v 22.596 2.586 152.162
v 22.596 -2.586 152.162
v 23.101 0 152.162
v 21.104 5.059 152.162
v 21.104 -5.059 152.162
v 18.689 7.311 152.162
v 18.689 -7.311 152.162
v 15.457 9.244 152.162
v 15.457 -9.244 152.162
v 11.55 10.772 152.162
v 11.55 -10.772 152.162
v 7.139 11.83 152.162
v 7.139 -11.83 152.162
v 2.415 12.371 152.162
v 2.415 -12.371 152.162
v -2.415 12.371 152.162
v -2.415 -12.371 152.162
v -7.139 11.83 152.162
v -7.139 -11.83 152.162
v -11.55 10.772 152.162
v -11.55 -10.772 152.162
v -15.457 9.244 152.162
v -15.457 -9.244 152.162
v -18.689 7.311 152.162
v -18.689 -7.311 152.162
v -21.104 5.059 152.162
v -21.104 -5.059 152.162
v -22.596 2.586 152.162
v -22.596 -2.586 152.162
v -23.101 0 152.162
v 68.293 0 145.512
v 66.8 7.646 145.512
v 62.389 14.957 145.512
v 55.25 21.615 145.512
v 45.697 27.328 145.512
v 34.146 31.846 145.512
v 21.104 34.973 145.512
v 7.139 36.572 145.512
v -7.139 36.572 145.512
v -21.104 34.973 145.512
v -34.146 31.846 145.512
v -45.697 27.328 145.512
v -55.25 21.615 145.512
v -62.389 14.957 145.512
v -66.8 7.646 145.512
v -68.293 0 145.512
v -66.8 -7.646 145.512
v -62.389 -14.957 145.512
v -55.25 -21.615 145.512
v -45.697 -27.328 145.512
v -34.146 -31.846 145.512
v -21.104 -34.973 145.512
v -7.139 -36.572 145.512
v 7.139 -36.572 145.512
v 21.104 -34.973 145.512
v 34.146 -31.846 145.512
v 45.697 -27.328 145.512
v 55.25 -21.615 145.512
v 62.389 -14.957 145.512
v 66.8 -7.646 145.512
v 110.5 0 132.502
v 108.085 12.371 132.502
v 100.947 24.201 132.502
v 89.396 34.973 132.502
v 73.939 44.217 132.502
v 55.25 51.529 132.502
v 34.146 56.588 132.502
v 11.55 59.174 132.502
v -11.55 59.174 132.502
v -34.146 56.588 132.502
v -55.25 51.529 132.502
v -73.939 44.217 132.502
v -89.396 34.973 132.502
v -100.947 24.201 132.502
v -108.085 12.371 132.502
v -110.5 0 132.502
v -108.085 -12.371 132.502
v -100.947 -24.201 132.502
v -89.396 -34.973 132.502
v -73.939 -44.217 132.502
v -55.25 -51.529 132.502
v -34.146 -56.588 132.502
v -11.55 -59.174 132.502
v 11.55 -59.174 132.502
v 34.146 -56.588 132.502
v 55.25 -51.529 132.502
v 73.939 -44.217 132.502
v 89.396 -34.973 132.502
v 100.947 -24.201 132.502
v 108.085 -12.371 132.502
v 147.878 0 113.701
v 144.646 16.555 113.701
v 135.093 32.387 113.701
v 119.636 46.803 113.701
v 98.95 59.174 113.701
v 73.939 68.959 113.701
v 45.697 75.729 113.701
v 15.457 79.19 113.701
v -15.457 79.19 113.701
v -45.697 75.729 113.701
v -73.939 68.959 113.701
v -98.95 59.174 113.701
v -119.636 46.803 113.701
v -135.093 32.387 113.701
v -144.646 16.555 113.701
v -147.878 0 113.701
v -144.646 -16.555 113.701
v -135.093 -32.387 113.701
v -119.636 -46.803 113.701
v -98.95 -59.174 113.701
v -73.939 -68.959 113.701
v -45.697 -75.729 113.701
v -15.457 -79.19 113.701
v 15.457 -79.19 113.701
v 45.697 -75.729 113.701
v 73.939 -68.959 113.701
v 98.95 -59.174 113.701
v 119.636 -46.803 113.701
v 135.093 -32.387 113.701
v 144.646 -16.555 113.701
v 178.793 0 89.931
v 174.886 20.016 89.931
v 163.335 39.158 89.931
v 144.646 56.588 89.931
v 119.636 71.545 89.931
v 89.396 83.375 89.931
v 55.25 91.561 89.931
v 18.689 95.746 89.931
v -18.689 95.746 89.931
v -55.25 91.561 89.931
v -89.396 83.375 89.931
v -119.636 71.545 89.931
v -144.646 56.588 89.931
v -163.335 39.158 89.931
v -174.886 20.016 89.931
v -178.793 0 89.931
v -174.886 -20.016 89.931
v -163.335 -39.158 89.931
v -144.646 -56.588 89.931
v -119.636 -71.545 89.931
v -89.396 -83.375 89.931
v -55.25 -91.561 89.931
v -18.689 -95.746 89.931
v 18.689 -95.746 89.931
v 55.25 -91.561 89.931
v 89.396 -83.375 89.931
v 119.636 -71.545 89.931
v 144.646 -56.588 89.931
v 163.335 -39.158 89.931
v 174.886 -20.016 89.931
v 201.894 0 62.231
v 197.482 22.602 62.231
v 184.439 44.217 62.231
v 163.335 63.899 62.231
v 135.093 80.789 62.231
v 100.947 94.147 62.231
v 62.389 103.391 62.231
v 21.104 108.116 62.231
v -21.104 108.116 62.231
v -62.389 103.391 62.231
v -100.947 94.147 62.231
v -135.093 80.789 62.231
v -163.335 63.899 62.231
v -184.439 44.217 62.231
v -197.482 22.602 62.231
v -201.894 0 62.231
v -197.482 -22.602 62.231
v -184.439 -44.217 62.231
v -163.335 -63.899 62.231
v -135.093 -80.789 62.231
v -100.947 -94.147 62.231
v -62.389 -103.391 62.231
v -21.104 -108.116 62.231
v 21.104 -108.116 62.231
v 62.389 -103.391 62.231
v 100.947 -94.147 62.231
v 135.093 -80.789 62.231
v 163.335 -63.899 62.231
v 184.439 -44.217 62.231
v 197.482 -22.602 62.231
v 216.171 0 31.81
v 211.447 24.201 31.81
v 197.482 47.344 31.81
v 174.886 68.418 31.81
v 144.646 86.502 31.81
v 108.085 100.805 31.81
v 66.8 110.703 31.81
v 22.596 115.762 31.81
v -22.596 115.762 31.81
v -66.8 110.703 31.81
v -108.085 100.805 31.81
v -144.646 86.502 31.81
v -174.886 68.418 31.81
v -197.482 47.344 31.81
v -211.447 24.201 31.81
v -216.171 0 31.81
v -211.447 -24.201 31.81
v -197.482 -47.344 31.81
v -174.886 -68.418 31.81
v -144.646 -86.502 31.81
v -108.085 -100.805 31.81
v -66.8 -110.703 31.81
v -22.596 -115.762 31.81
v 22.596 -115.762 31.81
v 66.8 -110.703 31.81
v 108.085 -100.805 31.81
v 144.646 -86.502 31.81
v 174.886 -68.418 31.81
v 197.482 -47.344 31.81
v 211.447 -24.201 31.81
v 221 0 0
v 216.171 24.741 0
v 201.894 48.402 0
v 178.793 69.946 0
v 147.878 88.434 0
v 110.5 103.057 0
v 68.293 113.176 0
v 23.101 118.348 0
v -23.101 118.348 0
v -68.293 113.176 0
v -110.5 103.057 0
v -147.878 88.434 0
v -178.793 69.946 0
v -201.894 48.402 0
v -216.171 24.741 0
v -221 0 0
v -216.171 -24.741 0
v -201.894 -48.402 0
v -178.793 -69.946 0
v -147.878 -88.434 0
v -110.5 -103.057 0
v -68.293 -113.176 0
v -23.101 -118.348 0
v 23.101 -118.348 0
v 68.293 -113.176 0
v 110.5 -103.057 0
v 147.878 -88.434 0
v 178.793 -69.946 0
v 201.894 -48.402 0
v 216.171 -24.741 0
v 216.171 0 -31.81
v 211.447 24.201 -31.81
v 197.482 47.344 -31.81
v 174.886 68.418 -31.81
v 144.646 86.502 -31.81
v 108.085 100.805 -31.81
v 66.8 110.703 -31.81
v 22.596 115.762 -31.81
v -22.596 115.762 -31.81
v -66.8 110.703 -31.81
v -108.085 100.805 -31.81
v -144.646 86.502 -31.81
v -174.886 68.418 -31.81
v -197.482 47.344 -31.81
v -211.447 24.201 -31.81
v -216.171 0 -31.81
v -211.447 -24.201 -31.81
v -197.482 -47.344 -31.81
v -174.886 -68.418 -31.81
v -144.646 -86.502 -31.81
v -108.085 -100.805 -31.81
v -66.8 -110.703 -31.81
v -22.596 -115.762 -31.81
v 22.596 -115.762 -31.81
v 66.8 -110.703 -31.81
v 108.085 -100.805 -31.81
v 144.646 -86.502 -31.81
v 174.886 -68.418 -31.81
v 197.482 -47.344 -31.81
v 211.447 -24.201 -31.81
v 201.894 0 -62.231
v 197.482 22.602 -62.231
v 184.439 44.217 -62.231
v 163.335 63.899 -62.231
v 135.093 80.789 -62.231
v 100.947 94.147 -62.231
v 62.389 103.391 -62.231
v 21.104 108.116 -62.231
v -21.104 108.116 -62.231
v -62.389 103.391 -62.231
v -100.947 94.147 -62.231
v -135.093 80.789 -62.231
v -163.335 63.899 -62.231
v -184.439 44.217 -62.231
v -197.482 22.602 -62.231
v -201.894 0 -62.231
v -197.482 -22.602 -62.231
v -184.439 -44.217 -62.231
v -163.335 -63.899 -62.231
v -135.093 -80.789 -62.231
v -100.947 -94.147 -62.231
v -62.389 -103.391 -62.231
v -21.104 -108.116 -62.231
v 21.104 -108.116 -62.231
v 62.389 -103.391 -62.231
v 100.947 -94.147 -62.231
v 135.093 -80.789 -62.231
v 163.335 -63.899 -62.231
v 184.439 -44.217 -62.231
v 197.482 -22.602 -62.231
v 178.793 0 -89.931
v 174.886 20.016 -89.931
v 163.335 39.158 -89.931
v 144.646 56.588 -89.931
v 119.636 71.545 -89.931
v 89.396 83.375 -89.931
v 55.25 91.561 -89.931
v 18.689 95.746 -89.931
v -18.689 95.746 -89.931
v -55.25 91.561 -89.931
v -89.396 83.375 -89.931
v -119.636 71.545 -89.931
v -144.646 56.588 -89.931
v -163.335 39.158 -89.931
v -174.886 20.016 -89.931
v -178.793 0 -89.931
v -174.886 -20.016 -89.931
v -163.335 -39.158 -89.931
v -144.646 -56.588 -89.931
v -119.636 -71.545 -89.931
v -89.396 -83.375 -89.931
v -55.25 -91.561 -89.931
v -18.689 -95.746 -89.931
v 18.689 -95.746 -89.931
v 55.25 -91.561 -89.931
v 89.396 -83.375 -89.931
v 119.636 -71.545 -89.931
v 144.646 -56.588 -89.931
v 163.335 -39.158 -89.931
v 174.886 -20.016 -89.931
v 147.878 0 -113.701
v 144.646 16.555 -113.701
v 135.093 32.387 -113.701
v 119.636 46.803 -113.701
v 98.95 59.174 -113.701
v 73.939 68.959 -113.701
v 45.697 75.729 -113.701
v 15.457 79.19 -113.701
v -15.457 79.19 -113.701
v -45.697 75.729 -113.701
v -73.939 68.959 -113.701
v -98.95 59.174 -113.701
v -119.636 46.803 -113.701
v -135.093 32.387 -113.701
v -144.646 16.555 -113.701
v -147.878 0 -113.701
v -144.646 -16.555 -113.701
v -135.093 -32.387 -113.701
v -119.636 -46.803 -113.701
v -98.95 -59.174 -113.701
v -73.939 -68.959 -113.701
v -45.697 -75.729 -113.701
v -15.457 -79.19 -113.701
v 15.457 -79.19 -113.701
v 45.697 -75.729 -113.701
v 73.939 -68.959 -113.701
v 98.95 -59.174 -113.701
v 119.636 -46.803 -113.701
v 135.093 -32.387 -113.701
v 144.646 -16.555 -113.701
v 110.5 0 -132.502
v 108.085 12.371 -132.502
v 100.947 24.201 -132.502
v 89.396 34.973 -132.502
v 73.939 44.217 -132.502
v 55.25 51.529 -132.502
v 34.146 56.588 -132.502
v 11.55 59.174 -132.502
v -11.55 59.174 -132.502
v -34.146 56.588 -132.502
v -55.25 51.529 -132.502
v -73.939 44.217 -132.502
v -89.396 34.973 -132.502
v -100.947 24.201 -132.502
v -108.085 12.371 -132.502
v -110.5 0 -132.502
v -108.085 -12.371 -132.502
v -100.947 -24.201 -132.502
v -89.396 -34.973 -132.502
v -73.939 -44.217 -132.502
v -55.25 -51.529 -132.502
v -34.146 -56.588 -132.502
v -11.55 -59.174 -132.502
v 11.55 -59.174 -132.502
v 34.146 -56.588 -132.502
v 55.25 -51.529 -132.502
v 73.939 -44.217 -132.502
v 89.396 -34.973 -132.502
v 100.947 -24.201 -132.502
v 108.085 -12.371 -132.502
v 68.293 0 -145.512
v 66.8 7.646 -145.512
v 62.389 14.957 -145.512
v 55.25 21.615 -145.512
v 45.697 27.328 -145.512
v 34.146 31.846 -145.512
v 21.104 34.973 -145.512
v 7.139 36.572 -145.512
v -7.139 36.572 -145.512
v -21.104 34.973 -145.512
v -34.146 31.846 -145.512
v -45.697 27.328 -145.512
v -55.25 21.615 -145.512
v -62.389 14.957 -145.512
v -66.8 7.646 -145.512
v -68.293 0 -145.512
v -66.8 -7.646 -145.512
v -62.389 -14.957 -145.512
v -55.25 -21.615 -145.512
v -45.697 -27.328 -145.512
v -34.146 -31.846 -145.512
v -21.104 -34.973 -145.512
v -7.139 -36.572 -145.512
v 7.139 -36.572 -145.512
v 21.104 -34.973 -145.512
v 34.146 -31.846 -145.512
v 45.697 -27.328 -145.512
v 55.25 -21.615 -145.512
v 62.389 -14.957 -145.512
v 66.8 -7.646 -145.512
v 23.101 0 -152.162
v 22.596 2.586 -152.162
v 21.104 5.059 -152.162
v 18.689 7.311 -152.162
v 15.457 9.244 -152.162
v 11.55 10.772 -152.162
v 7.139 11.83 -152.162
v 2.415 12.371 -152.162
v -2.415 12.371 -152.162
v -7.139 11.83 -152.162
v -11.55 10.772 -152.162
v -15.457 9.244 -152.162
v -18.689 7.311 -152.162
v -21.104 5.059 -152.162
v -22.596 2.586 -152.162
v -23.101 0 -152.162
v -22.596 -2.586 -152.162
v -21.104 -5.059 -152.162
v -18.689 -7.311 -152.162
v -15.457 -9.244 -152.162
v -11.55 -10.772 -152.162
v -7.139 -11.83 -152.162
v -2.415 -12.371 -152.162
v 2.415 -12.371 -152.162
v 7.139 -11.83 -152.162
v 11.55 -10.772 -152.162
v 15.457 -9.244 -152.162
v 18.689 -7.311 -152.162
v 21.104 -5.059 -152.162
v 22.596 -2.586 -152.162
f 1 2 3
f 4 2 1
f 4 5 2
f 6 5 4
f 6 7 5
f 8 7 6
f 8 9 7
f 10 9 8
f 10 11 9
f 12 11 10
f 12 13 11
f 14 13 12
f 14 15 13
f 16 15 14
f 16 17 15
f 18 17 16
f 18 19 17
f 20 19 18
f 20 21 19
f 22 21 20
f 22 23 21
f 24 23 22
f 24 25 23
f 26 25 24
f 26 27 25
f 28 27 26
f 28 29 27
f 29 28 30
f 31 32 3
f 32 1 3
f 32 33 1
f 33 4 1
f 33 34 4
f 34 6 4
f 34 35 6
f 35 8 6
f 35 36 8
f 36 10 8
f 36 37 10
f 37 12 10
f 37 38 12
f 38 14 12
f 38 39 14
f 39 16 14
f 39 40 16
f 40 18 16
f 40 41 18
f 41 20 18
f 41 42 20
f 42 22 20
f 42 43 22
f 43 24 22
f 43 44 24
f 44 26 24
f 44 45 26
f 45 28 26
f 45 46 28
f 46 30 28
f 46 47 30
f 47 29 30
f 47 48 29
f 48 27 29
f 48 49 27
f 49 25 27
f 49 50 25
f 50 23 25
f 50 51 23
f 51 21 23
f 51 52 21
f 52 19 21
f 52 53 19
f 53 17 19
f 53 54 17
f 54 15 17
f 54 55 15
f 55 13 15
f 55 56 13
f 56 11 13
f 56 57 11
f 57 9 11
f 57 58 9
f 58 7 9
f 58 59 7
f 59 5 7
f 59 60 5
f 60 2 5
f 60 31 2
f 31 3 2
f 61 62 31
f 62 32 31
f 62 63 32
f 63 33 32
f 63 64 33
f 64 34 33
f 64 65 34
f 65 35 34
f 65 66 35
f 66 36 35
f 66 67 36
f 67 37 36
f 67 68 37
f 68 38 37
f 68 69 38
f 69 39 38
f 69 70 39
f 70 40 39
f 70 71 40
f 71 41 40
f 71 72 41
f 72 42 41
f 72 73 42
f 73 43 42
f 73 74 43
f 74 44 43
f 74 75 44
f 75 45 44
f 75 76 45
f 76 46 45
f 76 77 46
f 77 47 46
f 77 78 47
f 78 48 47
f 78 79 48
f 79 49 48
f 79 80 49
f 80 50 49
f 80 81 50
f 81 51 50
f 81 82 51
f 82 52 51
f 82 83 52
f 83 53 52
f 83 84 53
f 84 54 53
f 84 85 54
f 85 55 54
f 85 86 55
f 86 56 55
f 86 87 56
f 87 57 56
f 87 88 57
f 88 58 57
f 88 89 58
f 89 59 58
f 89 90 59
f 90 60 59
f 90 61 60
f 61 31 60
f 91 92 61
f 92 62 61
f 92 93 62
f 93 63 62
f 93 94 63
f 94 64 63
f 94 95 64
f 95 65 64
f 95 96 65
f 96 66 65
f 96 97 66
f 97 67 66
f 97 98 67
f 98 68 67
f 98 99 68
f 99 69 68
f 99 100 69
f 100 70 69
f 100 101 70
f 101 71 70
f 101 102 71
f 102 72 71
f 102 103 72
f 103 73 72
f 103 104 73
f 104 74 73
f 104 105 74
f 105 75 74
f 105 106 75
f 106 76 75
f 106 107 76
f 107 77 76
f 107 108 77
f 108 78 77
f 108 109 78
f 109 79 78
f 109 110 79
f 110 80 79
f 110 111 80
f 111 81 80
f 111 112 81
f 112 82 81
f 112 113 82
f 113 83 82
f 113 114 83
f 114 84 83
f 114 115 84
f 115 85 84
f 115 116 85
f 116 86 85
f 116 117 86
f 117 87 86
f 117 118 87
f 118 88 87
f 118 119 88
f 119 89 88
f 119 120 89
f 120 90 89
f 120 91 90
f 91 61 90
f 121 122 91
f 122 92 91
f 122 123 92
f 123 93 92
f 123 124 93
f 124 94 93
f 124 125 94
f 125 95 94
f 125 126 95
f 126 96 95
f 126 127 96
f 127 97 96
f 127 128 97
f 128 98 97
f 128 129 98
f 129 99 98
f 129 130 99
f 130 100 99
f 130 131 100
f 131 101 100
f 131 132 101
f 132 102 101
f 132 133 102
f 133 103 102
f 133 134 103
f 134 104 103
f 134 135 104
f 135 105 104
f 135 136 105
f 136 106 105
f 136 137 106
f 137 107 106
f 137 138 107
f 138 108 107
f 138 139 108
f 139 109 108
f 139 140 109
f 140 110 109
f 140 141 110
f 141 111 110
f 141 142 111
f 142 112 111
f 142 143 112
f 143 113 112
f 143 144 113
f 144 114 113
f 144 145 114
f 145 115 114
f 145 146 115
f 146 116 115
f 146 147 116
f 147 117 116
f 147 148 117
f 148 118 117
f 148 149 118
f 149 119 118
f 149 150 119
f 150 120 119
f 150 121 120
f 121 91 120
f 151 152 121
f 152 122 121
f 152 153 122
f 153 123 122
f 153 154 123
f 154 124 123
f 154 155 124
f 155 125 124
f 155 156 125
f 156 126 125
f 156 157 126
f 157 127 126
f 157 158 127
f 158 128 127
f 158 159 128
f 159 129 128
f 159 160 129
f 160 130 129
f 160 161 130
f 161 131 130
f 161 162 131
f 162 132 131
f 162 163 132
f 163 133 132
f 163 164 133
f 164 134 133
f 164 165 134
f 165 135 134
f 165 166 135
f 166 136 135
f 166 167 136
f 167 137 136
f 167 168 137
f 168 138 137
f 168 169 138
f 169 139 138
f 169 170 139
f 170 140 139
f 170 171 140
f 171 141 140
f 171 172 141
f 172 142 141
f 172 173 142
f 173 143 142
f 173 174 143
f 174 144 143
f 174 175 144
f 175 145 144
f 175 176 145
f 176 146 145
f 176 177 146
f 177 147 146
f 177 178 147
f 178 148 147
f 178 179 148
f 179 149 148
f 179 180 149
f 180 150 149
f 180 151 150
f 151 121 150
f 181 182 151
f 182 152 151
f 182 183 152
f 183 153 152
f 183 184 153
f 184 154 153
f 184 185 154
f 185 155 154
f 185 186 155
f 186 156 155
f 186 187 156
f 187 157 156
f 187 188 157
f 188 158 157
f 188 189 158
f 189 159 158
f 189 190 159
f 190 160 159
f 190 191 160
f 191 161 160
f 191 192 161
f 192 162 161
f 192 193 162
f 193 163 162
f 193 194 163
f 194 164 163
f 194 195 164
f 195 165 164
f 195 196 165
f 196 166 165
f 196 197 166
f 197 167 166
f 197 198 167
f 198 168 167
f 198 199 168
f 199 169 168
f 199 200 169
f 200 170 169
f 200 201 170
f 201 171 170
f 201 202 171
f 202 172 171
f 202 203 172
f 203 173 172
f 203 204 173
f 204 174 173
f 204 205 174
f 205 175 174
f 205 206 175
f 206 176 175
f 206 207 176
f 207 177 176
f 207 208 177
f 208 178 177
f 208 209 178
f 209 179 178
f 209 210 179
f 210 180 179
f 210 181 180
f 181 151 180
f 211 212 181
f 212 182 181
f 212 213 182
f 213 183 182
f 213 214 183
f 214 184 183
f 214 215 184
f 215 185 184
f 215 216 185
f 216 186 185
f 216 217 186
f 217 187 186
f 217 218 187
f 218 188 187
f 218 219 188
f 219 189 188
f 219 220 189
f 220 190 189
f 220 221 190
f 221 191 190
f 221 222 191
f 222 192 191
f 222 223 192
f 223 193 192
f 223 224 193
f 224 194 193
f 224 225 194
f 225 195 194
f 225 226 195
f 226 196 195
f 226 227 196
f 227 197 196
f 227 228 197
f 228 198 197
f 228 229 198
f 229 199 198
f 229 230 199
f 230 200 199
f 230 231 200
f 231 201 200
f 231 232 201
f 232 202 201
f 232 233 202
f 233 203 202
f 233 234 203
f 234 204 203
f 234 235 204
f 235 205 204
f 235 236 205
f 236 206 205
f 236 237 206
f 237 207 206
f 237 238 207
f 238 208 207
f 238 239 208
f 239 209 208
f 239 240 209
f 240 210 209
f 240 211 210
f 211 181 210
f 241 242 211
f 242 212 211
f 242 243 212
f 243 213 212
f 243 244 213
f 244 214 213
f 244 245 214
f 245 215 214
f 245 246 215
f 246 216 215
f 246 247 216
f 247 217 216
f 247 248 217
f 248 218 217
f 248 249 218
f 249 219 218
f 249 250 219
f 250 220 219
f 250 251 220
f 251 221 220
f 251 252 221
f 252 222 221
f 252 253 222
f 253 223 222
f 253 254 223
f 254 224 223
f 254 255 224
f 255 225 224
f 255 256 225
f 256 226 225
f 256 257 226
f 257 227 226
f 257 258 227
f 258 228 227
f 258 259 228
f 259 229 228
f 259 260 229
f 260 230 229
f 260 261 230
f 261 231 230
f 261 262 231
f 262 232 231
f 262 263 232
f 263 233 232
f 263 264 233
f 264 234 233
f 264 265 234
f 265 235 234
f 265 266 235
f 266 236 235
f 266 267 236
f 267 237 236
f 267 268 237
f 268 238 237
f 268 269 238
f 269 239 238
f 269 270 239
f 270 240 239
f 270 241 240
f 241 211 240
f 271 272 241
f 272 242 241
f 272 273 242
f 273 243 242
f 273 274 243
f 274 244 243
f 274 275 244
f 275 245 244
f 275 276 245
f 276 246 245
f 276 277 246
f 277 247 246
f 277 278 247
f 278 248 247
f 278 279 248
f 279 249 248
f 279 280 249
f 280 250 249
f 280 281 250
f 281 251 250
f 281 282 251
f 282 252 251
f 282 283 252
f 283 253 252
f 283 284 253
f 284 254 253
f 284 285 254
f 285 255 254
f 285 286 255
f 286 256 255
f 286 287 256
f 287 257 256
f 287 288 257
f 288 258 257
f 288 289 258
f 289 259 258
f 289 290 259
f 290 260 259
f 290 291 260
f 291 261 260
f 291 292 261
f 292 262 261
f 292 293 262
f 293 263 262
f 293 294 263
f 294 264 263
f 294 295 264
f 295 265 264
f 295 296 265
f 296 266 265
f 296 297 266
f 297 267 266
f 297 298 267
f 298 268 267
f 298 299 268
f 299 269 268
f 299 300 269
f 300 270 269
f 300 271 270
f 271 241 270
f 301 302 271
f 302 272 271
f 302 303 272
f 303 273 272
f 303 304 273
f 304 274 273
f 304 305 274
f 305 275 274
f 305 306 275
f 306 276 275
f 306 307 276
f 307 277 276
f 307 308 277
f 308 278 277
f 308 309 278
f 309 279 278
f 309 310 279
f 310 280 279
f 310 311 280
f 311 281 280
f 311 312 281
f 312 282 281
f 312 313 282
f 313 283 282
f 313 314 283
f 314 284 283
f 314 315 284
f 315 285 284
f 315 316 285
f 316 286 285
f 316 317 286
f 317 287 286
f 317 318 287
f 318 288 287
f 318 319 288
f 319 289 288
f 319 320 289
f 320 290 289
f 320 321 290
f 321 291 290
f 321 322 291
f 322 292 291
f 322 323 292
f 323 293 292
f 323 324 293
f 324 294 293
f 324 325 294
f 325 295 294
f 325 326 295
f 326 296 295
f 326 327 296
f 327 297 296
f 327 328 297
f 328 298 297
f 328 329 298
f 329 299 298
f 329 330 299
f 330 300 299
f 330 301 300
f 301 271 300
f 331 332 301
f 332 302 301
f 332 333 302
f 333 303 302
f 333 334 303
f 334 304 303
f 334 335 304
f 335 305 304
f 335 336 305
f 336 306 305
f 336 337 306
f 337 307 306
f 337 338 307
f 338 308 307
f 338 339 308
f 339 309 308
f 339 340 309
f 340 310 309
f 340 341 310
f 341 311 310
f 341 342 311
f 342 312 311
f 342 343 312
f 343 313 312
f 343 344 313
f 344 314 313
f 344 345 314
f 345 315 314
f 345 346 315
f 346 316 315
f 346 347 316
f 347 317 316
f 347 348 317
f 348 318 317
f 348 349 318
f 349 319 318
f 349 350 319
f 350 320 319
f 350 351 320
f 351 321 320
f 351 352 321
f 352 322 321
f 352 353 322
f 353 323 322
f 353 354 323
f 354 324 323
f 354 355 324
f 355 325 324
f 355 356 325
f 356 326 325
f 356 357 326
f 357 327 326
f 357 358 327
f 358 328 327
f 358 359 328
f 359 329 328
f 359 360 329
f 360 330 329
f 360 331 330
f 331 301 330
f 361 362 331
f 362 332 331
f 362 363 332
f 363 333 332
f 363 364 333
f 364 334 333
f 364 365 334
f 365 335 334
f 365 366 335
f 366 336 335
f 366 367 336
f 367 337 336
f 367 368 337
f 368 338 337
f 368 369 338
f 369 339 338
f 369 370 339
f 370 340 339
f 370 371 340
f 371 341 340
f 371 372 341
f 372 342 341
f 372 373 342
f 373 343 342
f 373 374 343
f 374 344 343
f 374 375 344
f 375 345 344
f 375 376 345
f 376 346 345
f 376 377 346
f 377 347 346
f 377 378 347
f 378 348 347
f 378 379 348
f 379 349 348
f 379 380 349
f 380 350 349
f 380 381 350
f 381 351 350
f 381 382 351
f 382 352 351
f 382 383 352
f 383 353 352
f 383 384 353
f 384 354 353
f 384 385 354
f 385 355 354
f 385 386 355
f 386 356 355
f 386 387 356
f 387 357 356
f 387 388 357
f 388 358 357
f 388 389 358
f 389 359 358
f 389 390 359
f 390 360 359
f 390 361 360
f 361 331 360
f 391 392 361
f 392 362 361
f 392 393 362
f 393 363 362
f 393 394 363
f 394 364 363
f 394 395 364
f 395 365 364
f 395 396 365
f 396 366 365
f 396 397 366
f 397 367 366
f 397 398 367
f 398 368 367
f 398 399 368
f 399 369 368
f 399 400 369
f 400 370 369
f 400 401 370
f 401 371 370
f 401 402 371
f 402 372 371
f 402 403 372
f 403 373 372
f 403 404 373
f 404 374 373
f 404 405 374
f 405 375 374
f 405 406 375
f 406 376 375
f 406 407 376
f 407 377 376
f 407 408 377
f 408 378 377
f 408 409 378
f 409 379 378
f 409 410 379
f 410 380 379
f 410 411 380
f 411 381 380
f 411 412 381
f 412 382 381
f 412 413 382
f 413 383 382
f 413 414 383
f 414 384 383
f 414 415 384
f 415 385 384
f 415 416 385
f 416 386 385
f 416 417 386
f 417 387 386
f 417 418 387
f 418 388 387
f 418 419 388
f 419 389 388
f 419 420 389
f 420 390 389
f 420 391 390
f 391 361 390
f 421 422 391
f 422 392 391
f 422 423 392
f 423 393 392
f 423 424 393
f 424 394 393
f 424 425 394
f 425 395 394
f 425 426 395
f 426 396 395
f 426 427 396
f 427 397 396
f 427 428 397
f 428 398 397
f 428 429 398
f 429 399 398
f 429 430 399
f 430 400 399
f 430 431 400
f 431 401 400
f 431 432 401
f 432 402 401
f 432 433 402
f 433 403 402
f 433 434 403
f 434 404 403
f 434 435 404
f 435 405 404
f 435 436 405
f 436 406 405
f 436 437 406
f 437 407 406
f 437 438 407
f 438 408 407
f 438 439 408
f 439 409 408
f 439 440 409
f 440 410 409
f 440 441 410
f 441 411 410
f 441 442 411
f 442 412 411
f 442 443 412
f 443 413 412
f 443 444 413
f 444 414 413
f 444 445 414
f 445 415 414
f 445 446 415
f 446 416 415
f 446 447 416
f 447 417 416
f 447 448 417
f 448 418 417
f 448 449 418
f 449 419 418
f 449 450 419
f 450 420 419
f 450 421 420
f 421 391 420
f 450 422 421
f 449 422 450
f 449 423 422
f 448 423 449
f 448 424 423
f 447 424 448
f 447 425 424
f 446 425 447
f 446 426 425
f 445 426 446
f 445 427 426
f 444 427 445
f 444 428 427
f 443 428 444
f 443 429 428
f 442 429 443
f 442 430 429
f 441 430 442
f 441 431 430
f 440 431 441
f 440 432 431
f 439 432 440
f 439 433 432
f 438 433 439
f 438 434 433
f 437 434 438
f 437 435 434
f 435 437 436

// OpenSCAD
// Generated by SolidPython 1.0.1 on 2020-07-29 00:46:50


scale(v = [13, 7, 9]) {
	sphere(r = 17);
}
/***********************************************
*********      SolidPython code:      **********
************************************************
 
# import packages: SolidPython
from solid import *
from solid.utils import *
from itertools import chain, combinations, permutations


class Resize:

    def __init__(self, scad_file):
        self.scad_file = scad_file
        #self.scad_file = import_scad(scad_file)
        # cone/cylinder param:
        self.r1 = 0
        self.r2 = 0
        self.h = 0
        # rectangular prism param:
        self.w = 0
        self.l = 0
        # ellipse param:
        self.r = 0

    # import OpenScad code (file name corresponds to shape)


    # classify shape + parameters
    def assign(self, param1, param2, param3):
        if self.scad_file == 'cone.scad':
            self.r1 = param1
            self.r2 = param2
            self.h = param3
        elif self.scad_file == 'cylinder.scad':
            self.r1 = param1
            self.r2 = param2
            self.h = param3
        elif self.scad_file == 'rectangularPrism.scad':
            self.h = param1
            self.l = param2
            self.w = param3
        else:
            self.r = param1
            self.h = param2

    # resize parameters
    def iterate(self):
        x = range(3, 20, 2)
        i = 1
        if self.scad_file == 'cone.scad':
            tempList = list(permutations(x, 2))
            for temp in tempList:
                param1 = temp[0]
                param2 = temp[1]
                filepath = 'produced_scad_files/' + 'cone' + str(param1) + '_' + str(param2) + '_' + '.scad'
                scad_render_to_file(cylinder(h=param1, r1=param2, r2=0), filepath)

        elif self.scad_file == 'cylinder.scad':
            tempList = list(permutations(x, 3))
            for temp in tempList:
                param1 = temp[0]
                param2 = temp[1]
                filepath = 'produced_scad_files/' + 'cylinder' + str(param1) + '_' + str(param2) + '_' + '.scad'
                scad_render_to_file(cylinder(h=param1, r1=param2, r2=param2), filepath)

        elif self.scad_file == 'rectangularPrism.scad':
            tempList = list(permutations(x, 3))
            for temp in tempList:
                param1 = temp[0]
                param2 = temp[1]
                param3 = temp[2]
                filepath = 'produced_scad_files/' + 'rectangularPrism' + str(param1) + '_' + str(param2) + '_' + str(
                    param3) + '.scad'
                scad_render_to_file(cube(size=(param1, param2, param3)), filepath)

        elif self.scad_file == 'ellipse.scad':
            tempList = list(permutations(x, 4))
            for temp in tempList:
                param1 = temp[0]
                param2 = temp[1]
                param3 = temp[2]
                param4 = temp[3]
                filepath = 'produced_scad_files/' + 'ellipse' + str(param1) + '_' + str(param2) + '_' + str(param3) + '_' + str(param4) + '.scad'
                scad_render_to_file(scale([param1, param2, param3])(sphere(r=param4)), filepath)

    def render_to_scadfile(self):
        scad_render_to_file(scad, 'example.scad') 
 
************************************************/
